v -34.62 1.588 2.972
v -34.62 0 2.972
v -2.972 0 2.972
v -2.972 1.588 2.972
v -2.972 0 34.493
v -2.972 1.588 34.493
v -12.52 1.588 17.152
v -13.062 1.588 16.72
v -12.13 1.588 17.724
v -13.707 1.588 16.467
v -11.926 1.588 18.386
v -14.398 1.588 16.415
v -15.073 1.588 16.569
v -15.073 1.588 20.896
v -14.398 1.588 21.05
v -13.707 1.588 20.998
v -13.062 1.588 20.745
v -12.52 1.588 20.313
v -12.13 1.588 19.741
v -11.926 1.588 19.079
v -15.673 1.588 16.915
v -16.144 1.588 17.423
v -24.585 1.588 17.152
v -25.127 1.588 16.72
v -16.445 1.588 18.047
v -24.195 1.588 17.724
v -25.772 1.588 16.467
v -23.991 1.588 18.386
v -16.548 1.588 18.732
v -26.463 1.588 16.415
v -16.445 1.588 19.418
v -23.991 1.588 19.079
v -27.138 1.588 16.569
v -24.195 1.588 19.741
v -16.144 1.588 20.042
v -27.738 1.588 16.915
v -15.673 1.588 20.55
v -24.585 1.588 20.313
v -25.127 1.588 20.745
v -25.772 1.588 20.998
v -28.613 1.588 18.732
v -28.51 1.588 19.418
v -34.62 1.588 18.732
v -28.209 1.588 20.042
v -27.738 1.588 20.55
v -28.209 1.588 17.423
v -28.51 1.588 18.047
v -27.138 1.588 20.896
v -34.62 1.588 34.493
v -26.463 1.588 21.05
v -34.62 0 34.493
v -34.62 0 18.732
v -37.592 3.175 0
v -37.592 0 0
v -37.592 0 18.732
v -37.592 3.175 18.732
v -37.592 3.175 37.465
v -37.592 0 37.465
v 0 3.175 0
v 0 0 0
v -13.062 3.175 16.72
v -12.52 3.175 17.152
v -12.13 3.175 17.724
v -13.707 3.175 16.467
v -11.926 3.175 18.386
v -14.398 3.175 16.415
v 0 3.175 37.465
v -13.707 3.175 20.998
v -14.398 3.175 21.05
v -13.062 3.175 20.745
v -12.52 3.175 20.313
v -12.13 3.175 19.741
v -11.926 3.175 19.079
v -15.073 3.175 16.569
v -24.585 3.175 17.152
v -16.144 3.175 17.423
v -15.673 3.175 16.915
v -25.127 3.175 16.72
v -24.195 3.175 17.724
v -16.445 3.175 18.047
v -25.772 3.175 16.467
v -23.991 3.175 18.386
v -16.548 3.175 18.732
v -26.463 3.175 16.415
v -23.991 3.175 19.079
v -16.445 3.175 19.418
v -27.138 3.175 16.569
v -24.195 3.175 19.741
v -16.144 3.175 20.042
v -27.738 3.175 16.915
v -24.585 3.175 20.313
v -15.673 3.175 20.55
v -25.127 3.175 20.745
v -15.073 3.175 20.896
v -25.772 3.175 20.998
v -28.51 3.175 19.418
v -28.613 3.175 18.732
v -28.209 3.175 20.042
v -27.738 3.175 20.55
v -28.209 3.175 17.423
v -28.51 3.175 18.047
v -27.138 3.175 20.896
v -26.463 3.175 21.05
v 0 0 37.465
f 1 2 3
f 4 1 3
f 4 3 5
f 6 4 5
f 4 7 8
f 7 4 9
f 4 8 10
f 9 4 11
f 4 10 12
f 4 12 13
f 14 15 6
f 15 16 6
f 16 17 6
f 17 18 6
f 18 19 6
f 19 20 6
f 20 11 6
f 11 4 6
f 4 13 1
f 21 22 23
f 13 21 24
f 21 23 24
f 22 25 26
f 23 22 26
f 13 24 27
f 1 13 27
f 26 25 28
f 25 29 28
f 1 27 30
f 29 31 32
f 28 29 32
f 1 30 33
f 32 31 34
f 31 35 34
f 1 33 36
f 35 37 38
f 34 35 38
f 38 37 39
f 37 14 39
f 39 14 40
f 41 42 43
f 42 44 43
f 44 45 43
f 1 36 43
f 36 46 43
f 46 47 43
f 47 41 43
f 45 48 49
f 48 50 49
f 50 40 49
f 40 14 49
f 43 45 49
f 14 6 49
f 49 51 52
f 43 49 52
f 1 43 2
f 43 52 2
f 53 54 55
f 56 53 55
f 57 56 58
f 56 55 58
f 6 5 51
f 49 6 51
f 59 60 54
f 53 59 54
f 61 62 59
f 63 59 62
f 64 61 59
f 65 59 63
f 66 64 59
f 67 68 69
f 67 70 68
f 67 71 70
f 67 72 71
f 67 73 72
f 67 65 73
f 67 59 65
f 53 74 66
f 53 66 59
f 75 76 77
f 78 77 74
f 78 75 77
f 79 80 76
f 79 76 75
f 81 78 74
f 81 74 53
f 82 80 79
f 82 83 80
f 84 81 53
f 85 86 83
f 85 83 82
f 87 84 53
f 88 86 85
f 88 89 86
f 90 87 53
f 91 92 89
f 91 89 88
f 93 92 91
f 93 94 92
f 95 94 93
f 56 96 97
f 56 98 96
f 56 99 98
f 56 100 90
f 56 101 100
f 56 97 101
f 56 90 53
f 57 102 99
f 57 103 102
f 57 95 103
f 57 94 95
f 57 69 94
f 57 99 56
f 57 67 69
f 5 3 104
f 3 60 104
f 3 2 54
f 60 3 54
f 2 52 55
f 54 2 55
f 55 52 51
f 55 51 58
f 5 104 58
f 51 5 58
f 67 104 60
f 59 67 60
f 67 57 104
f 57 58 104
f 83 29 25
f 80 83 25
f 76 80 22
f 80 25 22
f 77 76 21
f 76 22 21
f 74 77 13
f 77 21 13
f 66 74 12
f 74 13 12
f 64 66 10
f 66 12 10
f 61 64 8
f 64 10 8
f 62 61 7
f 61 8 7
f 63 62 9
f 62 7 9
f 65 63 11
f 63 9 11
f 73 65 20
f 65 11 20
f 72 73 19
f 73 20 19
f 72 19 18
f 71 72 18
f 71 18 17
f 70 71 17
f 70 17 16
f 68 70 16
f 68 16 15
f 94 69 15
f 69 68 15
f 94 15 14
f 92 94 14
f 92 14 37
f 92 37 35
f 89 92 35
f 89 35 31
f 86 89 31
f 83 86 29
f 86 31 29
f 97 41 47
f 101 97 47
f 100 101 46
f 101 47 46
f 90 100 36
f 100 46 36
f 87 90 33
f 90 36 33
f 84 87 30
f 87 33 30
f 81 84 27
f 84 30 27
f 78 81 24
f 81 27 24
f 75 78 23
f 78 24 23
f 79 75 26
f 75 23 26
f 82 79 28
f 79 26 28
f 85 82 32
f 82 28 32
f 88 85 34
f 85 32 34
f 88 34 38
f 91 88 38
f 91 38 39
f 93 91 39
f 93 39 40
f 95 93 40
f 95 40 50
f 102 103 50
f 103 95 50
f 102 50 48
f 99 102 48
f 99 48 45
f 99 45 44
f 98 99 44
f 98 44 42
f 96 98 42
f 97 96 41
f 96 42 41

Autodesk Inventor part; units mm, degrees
ref_plane "YZ Plane" through (0, 0, 0) normal (1, 0, 0) x (0, 1, 0)
ref_plane "XZ Plane" through (0, 0, 0) normal (0, 1, 0) x (-1, 0, 0)
ref_plane "XY Plane" through (0, 0, 0) normal (0, 0, 1) x (1, 0, 0)
sketch "Sketch1" plane through (0, 0, 0) normal (0, 1, 0) x (-1, 0, 0)
  line L0 (0, 0) -> (37.592, 0)
  line L1 (37.592, 0) -> (37.592, 37.465)
  line L2 (37.592, 37.465) -> (0, 37.465)
  line L3 (0, 37.465) -> (0, 0)
  line L4 (37.592, 18.7325) -> (26.289, 18.7325)
  line L5 (37.592, 18.7325) -> (48.895, 18.7325) construction
  circle A0 centre (26.289, 18.7325) radius 2.3241
  circle A1 centre (14.224, 18.7325) radius 2.3241
  line L6 (34.6202, 34.4932) -> (34.6202, 2.9718)
  line L7 (34.6202, 2.9718) -> (2.9718, 2.9718)
  line L8 (2.9718, 2.9718) -> (2.9718, 34.4932)
  line L9 (2.9718, 34.4932) -> (34.6202, 34.4932)
  dimension "d0" = 37.592
  dimension "d1" = 37.465
  dimension "d2" = 11.303
  dimension "d3" = 180
  dimension "d4" = 4.6482
  dimension "d7" = 12.065
  dimension "d14" = 2.9718
extrude "Extrusion1" add sketch "Sketch1" along normal blind 3.175 contours L6 L7 L8 L9 | L3 L2 L1 L0
extrude "Extrusion2" cut sketch "Sketch1" along normal blind 1.5875 contours L6 L7 L8 L9
properties part number "gps sensor holder"
